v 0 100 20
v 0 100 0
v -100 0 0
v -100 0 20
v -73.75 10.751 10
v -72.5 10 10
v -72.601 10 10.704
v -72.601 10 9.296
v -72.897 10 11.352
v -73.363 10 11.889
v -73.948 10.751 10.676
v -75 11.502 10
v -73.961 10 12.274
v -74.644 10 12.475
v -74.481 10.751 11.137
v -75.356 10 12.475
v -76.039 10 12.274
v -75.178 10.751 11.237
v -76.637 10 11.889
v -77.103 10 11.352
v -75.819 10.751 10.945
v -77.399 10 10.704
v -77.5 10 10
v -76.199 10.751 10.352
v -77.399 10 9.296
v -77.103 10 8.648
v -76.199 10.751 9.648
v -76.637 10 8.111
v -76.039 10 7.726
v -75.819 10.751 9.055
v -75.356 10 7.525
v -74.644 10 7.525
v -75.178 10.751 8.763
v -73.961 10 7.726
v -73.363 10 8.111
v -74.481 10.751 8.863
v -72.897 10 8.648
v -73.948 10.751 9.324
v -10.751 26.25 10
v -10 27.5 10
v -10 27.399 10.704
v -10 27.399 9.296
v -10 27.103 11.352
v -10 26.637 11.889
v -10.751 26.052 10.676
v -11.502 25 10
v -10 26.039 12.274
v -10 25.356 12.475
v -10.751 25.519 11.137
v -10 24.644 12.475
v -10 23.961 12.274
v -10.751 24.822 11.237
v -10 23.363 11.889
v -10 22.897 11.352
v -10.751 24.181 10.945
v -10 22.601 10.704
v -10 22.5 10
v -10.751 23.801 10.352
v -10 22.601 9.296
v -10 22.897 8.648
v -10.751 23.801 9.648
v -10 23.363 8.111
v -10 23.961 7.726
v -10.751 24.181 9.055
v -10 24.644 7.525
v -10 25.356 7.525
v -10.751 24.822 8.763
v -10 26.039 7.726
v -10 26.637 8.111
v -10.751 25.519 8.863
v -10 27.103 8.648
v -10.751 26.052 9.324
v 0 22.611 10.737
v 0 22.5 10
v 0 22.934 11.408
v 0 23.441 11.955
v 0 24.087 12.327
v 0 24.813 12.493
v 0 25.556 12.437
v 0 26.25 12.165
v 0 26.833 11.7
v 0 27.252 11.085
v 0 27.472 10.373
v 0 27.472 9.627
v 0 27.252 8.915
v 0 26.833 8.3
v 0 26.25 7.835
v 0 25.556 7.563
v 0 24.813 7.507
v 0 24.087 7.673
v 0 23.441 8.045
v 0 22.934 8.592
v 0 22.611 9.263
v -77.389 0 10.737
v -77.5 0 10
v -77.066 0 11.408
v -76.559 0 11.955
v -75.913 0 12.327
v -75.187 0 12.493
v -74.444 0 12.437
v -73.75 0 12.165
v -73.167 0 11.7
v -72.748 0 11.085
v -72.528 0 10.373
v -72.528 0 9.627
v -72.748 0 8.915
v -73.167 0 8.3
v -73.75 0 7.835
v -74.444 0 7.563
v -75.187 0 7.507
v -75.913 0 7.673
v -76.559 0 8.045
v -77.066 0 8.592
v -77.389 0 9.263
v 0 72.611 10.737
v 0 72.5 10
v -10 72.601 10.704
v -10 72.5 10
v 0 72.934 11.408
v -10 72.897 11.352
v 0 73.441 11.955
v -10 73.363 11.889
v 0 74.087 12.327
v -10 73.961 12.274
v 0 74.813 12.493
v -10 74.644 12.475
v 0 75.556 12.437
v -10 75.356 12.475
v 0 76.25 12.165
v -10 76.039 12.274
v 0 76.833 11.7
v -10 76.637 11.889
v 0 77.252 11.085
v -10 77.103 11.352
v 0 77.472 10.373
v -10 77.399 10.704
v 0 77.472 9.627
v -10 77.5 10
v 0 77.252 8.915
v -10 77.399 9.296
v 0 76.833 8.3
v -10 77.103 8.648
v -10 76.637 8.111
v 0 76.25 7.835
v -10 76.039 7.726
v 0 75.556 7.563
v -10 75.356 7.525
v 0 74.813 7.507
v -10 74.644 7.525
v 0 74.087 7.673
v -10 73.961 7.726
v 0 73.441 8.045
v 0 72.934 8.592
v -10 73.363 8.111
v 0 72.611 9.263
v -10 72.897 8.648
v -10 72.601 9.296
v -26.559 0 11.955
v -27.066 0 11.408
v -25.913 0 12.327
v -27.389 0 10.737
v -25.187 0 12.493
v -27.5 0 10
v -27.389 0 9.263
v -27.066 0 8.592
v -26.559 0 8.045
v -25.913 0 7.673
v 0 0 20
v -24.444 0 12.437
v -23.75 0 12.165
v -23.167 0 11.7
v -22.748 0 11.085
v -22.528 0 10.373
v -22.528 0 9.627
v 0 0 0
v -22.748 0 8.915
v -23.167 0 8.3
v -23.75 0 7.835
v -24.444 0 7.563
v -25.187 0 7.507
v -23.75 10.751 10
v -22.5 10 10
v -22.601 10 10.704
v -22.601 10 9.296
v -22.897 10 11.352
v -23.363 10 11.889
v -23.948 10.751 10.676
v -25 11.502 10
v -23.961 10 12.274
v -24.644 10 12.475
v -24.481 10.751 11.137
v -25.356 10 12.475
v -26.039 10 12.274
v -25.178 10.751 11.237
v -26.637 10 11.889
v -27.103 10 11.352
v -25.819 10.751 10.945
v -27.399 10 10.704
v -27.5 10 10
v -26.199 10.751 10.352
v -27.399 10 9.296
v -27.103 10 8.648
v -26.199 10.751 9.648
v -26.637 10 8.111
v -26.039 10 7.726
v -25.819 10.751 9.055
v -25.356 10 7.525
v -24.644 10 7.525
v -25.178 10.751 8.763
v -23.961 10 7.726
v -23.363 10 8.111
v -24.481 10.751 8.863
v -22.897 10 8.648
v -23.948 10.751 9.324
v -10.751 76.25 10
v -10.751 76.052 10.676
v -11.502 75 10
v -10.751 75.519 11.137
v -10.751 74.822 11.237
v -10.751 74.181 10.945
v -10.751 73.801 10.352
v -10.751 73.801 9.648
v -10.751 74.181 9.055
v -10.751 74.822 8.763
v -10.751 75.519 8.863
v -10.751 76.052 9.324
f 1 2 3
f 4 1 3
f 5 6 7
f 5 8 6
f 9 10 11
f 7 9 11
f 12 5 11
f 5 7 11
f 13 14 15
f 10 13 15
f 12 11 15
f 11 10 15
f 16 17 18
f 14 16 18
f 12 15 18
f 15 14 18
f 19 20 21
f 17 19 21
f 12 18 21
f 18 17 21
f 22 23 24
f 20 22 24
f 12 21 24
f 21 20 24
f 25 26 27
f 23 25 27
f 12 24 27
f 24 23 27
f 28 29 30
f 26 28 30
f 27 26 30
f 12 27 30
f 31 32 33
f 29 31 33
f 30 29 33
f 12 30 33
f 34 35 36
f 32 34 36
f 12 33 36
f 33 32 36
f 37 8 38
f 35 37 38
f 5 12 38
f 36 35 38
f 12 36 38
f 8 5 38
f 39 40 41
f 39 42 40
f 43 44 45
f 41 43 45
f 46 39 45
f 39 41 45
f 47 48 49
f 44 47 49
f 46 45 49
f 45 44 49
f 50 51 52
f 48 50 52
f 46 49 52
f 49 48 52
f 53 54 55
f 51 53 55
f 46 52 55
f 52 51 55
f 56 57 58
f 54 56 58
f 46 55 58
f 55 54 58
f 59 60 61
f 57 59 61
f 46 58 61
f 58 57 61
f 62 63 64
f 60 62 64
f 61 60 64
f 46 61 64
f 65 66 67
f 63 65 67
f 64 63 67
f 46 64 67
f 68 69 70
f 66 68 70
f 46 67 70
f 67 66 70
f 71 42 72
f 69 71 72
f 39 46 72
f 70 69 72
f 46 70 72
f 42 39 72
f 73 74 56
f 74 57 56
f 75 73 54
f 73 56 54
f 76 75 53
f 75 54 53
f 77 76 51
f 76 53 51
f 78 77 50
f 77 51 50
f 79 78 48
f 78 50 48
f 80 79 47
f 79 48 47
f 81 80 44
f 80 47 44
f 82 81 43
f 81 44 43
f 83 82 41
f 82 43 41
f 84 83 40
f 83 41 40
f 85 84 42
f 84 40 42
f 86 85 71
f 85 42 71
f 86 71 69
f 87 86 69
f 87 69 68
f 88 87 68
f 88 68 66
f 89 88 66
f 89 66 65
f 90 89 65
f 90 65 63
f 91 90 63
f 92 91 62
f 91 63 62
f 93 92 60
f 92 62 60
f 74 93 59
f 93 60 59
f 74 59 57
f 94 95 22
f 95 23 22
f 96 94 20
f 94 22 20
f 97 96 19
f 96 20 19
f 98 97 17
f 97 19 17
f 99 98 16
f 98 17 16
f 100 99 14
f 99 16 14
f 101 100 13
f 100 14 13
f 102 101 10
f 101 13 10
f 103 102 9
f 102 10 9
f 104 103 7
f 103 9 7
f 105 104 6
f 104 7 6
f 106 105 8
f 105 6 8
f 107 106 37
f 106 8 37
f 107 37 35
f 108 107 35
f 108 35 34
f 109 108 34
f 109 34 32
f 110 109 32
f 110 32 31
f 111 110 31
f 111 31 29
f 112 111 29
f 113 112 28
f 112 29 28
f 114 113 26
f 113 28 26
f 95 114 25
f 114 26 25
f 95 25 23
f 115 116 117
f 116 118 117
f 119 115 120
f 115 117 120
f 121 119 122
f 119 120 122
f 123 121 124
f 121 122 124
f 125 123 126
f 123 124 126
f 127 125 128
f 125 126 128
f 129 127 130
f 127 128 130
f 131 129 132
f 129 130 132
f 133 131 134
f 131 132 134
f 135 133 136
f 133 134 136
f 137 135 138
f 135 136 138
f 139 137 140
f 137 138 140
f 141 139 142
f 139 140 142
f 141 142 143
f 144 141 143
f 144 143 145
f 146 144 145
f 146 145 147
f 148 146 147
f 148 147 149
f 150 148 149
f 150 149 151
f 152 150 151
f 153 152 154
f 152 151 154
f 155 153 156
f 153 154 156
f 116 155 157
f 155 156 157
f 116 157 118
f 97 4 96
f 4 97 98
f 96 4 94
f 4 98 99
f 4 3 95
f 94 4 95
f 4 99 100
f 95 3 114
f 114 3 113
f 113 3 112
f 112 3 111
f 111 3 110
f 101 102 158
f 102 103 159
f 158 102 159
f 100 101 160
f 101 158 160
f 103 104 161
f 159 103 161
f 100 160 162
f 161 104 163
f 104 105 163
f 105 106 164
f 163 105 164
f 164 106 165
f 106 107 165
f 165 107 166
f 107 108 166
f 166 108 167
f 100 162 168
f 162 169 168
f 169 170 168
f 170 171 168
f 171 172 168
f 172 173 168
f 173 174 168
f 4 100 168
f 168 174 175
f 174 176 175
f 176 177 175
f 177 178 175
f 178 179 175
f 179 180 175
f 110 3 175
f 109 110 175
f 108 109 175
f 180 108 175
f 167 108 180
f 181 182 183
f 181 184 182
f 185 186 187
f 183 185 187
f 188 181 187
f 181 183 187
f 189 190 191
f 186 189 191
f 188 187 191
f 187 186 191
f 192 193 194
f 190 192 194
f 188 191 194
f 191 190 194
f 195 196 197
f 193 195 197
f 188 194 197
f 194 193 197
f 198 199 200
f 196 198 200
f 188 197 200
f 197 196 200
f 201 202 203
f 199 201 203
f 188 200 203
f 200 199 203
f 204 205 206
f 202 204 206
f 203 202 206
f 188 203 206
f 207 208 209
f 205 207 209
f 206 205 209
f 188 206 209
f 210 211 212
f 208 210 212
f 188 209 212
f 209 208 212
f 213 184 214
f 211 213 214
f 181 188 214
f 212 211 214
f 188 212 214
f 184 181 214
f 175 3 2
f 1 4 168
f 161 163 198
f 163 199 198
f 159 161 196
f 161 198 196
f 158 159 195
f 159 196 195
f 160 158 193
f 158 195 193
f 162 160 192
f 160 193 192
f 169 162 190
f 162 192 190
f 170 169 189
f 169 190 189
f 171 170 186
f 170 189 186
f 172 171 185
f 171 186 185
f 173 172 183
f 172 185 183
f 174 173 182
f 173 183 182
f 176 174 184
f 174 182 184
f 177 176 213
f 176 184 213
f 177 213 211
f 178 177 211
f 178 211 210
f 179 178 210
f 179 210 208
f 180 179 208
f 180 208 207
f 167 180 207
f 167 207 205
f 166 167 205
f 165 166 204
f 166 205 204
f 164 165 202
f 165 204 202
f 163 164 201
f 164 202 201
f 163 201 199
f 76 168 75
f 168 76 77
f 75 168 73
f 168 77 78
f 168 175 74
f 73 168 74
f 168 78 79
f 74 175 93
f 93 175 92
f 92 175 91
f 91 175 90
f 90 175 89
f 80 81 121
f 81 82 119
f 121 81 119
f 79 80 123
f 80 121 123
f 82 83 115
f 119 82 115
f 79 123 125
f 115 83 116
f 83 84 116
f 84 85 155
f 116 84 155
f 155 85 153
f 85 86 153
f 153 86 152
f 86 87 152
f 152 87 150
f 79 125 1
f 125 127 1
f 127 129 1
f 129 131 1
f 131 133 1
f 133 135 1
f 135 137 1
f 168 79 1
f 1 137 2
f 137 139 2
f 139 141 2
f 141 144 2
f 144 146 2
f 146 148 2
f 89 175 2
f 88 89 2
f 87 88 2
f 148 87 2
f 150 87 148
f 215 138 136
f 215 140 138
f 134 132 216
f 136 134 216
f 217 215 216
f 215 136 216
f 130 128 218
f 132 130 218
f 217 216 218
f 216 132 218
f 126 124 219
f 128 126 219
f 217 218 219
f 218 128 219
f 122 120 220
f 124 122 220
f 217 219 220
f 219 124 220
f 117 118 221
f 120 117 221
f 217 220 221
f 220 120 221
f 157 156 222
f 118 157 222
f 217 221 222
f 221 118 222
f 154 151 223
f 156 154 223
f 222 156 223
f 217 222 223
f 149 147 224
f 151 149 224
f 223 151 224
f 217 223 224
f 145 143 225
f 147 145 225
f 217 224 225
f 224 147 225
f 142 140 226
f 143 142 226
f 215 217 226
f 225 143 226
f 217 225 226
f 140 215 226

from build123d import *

# Parameters (mm, degrees)
F1_DEPTH = 20
F3_D     = 5
F3_DEPTH = 10
F3_TIP   = 1.5021515476
F5_D     = 5
F5_DEPTH = 10
F5_TIP   = 1.5021515476


with BuildPart() as f1:
    # F0 (on Top) → F1 (new body)
    with BuildSketch(Plane.XY):
        Polygon((-100, 0), (0, 0), (0, 100), align=None)
    extrude(amount=F1_DEPTH)

    # F3
    with Locations(Plane.YZ):
        with Locations((75, 10), (25, 10)):
            Hole(F3_D / 2, depth=F3_DEPTH)
            with Locations((0, 0, -(F3_DEPTH + F3_TIP / 2))):  # 118° drill point
                Cone(0, F3_D / 2, F3_TIP, mode=Mode.SUBTRACT)

    # F5
    with Locations(Plane.XZ):
        with Locations((-25, 10), (-75, 10)):
            Hole(F5_D / 2, depth=F5_DEPTH)
            with Locations((0, 0, -(F5_DEPTH + F5_TIP / 2))):  # 118° drill point
                Cone(0, F5_D / 2, F5_TIP, mode=Mode.SUBTRACT)


solid = f1.part
